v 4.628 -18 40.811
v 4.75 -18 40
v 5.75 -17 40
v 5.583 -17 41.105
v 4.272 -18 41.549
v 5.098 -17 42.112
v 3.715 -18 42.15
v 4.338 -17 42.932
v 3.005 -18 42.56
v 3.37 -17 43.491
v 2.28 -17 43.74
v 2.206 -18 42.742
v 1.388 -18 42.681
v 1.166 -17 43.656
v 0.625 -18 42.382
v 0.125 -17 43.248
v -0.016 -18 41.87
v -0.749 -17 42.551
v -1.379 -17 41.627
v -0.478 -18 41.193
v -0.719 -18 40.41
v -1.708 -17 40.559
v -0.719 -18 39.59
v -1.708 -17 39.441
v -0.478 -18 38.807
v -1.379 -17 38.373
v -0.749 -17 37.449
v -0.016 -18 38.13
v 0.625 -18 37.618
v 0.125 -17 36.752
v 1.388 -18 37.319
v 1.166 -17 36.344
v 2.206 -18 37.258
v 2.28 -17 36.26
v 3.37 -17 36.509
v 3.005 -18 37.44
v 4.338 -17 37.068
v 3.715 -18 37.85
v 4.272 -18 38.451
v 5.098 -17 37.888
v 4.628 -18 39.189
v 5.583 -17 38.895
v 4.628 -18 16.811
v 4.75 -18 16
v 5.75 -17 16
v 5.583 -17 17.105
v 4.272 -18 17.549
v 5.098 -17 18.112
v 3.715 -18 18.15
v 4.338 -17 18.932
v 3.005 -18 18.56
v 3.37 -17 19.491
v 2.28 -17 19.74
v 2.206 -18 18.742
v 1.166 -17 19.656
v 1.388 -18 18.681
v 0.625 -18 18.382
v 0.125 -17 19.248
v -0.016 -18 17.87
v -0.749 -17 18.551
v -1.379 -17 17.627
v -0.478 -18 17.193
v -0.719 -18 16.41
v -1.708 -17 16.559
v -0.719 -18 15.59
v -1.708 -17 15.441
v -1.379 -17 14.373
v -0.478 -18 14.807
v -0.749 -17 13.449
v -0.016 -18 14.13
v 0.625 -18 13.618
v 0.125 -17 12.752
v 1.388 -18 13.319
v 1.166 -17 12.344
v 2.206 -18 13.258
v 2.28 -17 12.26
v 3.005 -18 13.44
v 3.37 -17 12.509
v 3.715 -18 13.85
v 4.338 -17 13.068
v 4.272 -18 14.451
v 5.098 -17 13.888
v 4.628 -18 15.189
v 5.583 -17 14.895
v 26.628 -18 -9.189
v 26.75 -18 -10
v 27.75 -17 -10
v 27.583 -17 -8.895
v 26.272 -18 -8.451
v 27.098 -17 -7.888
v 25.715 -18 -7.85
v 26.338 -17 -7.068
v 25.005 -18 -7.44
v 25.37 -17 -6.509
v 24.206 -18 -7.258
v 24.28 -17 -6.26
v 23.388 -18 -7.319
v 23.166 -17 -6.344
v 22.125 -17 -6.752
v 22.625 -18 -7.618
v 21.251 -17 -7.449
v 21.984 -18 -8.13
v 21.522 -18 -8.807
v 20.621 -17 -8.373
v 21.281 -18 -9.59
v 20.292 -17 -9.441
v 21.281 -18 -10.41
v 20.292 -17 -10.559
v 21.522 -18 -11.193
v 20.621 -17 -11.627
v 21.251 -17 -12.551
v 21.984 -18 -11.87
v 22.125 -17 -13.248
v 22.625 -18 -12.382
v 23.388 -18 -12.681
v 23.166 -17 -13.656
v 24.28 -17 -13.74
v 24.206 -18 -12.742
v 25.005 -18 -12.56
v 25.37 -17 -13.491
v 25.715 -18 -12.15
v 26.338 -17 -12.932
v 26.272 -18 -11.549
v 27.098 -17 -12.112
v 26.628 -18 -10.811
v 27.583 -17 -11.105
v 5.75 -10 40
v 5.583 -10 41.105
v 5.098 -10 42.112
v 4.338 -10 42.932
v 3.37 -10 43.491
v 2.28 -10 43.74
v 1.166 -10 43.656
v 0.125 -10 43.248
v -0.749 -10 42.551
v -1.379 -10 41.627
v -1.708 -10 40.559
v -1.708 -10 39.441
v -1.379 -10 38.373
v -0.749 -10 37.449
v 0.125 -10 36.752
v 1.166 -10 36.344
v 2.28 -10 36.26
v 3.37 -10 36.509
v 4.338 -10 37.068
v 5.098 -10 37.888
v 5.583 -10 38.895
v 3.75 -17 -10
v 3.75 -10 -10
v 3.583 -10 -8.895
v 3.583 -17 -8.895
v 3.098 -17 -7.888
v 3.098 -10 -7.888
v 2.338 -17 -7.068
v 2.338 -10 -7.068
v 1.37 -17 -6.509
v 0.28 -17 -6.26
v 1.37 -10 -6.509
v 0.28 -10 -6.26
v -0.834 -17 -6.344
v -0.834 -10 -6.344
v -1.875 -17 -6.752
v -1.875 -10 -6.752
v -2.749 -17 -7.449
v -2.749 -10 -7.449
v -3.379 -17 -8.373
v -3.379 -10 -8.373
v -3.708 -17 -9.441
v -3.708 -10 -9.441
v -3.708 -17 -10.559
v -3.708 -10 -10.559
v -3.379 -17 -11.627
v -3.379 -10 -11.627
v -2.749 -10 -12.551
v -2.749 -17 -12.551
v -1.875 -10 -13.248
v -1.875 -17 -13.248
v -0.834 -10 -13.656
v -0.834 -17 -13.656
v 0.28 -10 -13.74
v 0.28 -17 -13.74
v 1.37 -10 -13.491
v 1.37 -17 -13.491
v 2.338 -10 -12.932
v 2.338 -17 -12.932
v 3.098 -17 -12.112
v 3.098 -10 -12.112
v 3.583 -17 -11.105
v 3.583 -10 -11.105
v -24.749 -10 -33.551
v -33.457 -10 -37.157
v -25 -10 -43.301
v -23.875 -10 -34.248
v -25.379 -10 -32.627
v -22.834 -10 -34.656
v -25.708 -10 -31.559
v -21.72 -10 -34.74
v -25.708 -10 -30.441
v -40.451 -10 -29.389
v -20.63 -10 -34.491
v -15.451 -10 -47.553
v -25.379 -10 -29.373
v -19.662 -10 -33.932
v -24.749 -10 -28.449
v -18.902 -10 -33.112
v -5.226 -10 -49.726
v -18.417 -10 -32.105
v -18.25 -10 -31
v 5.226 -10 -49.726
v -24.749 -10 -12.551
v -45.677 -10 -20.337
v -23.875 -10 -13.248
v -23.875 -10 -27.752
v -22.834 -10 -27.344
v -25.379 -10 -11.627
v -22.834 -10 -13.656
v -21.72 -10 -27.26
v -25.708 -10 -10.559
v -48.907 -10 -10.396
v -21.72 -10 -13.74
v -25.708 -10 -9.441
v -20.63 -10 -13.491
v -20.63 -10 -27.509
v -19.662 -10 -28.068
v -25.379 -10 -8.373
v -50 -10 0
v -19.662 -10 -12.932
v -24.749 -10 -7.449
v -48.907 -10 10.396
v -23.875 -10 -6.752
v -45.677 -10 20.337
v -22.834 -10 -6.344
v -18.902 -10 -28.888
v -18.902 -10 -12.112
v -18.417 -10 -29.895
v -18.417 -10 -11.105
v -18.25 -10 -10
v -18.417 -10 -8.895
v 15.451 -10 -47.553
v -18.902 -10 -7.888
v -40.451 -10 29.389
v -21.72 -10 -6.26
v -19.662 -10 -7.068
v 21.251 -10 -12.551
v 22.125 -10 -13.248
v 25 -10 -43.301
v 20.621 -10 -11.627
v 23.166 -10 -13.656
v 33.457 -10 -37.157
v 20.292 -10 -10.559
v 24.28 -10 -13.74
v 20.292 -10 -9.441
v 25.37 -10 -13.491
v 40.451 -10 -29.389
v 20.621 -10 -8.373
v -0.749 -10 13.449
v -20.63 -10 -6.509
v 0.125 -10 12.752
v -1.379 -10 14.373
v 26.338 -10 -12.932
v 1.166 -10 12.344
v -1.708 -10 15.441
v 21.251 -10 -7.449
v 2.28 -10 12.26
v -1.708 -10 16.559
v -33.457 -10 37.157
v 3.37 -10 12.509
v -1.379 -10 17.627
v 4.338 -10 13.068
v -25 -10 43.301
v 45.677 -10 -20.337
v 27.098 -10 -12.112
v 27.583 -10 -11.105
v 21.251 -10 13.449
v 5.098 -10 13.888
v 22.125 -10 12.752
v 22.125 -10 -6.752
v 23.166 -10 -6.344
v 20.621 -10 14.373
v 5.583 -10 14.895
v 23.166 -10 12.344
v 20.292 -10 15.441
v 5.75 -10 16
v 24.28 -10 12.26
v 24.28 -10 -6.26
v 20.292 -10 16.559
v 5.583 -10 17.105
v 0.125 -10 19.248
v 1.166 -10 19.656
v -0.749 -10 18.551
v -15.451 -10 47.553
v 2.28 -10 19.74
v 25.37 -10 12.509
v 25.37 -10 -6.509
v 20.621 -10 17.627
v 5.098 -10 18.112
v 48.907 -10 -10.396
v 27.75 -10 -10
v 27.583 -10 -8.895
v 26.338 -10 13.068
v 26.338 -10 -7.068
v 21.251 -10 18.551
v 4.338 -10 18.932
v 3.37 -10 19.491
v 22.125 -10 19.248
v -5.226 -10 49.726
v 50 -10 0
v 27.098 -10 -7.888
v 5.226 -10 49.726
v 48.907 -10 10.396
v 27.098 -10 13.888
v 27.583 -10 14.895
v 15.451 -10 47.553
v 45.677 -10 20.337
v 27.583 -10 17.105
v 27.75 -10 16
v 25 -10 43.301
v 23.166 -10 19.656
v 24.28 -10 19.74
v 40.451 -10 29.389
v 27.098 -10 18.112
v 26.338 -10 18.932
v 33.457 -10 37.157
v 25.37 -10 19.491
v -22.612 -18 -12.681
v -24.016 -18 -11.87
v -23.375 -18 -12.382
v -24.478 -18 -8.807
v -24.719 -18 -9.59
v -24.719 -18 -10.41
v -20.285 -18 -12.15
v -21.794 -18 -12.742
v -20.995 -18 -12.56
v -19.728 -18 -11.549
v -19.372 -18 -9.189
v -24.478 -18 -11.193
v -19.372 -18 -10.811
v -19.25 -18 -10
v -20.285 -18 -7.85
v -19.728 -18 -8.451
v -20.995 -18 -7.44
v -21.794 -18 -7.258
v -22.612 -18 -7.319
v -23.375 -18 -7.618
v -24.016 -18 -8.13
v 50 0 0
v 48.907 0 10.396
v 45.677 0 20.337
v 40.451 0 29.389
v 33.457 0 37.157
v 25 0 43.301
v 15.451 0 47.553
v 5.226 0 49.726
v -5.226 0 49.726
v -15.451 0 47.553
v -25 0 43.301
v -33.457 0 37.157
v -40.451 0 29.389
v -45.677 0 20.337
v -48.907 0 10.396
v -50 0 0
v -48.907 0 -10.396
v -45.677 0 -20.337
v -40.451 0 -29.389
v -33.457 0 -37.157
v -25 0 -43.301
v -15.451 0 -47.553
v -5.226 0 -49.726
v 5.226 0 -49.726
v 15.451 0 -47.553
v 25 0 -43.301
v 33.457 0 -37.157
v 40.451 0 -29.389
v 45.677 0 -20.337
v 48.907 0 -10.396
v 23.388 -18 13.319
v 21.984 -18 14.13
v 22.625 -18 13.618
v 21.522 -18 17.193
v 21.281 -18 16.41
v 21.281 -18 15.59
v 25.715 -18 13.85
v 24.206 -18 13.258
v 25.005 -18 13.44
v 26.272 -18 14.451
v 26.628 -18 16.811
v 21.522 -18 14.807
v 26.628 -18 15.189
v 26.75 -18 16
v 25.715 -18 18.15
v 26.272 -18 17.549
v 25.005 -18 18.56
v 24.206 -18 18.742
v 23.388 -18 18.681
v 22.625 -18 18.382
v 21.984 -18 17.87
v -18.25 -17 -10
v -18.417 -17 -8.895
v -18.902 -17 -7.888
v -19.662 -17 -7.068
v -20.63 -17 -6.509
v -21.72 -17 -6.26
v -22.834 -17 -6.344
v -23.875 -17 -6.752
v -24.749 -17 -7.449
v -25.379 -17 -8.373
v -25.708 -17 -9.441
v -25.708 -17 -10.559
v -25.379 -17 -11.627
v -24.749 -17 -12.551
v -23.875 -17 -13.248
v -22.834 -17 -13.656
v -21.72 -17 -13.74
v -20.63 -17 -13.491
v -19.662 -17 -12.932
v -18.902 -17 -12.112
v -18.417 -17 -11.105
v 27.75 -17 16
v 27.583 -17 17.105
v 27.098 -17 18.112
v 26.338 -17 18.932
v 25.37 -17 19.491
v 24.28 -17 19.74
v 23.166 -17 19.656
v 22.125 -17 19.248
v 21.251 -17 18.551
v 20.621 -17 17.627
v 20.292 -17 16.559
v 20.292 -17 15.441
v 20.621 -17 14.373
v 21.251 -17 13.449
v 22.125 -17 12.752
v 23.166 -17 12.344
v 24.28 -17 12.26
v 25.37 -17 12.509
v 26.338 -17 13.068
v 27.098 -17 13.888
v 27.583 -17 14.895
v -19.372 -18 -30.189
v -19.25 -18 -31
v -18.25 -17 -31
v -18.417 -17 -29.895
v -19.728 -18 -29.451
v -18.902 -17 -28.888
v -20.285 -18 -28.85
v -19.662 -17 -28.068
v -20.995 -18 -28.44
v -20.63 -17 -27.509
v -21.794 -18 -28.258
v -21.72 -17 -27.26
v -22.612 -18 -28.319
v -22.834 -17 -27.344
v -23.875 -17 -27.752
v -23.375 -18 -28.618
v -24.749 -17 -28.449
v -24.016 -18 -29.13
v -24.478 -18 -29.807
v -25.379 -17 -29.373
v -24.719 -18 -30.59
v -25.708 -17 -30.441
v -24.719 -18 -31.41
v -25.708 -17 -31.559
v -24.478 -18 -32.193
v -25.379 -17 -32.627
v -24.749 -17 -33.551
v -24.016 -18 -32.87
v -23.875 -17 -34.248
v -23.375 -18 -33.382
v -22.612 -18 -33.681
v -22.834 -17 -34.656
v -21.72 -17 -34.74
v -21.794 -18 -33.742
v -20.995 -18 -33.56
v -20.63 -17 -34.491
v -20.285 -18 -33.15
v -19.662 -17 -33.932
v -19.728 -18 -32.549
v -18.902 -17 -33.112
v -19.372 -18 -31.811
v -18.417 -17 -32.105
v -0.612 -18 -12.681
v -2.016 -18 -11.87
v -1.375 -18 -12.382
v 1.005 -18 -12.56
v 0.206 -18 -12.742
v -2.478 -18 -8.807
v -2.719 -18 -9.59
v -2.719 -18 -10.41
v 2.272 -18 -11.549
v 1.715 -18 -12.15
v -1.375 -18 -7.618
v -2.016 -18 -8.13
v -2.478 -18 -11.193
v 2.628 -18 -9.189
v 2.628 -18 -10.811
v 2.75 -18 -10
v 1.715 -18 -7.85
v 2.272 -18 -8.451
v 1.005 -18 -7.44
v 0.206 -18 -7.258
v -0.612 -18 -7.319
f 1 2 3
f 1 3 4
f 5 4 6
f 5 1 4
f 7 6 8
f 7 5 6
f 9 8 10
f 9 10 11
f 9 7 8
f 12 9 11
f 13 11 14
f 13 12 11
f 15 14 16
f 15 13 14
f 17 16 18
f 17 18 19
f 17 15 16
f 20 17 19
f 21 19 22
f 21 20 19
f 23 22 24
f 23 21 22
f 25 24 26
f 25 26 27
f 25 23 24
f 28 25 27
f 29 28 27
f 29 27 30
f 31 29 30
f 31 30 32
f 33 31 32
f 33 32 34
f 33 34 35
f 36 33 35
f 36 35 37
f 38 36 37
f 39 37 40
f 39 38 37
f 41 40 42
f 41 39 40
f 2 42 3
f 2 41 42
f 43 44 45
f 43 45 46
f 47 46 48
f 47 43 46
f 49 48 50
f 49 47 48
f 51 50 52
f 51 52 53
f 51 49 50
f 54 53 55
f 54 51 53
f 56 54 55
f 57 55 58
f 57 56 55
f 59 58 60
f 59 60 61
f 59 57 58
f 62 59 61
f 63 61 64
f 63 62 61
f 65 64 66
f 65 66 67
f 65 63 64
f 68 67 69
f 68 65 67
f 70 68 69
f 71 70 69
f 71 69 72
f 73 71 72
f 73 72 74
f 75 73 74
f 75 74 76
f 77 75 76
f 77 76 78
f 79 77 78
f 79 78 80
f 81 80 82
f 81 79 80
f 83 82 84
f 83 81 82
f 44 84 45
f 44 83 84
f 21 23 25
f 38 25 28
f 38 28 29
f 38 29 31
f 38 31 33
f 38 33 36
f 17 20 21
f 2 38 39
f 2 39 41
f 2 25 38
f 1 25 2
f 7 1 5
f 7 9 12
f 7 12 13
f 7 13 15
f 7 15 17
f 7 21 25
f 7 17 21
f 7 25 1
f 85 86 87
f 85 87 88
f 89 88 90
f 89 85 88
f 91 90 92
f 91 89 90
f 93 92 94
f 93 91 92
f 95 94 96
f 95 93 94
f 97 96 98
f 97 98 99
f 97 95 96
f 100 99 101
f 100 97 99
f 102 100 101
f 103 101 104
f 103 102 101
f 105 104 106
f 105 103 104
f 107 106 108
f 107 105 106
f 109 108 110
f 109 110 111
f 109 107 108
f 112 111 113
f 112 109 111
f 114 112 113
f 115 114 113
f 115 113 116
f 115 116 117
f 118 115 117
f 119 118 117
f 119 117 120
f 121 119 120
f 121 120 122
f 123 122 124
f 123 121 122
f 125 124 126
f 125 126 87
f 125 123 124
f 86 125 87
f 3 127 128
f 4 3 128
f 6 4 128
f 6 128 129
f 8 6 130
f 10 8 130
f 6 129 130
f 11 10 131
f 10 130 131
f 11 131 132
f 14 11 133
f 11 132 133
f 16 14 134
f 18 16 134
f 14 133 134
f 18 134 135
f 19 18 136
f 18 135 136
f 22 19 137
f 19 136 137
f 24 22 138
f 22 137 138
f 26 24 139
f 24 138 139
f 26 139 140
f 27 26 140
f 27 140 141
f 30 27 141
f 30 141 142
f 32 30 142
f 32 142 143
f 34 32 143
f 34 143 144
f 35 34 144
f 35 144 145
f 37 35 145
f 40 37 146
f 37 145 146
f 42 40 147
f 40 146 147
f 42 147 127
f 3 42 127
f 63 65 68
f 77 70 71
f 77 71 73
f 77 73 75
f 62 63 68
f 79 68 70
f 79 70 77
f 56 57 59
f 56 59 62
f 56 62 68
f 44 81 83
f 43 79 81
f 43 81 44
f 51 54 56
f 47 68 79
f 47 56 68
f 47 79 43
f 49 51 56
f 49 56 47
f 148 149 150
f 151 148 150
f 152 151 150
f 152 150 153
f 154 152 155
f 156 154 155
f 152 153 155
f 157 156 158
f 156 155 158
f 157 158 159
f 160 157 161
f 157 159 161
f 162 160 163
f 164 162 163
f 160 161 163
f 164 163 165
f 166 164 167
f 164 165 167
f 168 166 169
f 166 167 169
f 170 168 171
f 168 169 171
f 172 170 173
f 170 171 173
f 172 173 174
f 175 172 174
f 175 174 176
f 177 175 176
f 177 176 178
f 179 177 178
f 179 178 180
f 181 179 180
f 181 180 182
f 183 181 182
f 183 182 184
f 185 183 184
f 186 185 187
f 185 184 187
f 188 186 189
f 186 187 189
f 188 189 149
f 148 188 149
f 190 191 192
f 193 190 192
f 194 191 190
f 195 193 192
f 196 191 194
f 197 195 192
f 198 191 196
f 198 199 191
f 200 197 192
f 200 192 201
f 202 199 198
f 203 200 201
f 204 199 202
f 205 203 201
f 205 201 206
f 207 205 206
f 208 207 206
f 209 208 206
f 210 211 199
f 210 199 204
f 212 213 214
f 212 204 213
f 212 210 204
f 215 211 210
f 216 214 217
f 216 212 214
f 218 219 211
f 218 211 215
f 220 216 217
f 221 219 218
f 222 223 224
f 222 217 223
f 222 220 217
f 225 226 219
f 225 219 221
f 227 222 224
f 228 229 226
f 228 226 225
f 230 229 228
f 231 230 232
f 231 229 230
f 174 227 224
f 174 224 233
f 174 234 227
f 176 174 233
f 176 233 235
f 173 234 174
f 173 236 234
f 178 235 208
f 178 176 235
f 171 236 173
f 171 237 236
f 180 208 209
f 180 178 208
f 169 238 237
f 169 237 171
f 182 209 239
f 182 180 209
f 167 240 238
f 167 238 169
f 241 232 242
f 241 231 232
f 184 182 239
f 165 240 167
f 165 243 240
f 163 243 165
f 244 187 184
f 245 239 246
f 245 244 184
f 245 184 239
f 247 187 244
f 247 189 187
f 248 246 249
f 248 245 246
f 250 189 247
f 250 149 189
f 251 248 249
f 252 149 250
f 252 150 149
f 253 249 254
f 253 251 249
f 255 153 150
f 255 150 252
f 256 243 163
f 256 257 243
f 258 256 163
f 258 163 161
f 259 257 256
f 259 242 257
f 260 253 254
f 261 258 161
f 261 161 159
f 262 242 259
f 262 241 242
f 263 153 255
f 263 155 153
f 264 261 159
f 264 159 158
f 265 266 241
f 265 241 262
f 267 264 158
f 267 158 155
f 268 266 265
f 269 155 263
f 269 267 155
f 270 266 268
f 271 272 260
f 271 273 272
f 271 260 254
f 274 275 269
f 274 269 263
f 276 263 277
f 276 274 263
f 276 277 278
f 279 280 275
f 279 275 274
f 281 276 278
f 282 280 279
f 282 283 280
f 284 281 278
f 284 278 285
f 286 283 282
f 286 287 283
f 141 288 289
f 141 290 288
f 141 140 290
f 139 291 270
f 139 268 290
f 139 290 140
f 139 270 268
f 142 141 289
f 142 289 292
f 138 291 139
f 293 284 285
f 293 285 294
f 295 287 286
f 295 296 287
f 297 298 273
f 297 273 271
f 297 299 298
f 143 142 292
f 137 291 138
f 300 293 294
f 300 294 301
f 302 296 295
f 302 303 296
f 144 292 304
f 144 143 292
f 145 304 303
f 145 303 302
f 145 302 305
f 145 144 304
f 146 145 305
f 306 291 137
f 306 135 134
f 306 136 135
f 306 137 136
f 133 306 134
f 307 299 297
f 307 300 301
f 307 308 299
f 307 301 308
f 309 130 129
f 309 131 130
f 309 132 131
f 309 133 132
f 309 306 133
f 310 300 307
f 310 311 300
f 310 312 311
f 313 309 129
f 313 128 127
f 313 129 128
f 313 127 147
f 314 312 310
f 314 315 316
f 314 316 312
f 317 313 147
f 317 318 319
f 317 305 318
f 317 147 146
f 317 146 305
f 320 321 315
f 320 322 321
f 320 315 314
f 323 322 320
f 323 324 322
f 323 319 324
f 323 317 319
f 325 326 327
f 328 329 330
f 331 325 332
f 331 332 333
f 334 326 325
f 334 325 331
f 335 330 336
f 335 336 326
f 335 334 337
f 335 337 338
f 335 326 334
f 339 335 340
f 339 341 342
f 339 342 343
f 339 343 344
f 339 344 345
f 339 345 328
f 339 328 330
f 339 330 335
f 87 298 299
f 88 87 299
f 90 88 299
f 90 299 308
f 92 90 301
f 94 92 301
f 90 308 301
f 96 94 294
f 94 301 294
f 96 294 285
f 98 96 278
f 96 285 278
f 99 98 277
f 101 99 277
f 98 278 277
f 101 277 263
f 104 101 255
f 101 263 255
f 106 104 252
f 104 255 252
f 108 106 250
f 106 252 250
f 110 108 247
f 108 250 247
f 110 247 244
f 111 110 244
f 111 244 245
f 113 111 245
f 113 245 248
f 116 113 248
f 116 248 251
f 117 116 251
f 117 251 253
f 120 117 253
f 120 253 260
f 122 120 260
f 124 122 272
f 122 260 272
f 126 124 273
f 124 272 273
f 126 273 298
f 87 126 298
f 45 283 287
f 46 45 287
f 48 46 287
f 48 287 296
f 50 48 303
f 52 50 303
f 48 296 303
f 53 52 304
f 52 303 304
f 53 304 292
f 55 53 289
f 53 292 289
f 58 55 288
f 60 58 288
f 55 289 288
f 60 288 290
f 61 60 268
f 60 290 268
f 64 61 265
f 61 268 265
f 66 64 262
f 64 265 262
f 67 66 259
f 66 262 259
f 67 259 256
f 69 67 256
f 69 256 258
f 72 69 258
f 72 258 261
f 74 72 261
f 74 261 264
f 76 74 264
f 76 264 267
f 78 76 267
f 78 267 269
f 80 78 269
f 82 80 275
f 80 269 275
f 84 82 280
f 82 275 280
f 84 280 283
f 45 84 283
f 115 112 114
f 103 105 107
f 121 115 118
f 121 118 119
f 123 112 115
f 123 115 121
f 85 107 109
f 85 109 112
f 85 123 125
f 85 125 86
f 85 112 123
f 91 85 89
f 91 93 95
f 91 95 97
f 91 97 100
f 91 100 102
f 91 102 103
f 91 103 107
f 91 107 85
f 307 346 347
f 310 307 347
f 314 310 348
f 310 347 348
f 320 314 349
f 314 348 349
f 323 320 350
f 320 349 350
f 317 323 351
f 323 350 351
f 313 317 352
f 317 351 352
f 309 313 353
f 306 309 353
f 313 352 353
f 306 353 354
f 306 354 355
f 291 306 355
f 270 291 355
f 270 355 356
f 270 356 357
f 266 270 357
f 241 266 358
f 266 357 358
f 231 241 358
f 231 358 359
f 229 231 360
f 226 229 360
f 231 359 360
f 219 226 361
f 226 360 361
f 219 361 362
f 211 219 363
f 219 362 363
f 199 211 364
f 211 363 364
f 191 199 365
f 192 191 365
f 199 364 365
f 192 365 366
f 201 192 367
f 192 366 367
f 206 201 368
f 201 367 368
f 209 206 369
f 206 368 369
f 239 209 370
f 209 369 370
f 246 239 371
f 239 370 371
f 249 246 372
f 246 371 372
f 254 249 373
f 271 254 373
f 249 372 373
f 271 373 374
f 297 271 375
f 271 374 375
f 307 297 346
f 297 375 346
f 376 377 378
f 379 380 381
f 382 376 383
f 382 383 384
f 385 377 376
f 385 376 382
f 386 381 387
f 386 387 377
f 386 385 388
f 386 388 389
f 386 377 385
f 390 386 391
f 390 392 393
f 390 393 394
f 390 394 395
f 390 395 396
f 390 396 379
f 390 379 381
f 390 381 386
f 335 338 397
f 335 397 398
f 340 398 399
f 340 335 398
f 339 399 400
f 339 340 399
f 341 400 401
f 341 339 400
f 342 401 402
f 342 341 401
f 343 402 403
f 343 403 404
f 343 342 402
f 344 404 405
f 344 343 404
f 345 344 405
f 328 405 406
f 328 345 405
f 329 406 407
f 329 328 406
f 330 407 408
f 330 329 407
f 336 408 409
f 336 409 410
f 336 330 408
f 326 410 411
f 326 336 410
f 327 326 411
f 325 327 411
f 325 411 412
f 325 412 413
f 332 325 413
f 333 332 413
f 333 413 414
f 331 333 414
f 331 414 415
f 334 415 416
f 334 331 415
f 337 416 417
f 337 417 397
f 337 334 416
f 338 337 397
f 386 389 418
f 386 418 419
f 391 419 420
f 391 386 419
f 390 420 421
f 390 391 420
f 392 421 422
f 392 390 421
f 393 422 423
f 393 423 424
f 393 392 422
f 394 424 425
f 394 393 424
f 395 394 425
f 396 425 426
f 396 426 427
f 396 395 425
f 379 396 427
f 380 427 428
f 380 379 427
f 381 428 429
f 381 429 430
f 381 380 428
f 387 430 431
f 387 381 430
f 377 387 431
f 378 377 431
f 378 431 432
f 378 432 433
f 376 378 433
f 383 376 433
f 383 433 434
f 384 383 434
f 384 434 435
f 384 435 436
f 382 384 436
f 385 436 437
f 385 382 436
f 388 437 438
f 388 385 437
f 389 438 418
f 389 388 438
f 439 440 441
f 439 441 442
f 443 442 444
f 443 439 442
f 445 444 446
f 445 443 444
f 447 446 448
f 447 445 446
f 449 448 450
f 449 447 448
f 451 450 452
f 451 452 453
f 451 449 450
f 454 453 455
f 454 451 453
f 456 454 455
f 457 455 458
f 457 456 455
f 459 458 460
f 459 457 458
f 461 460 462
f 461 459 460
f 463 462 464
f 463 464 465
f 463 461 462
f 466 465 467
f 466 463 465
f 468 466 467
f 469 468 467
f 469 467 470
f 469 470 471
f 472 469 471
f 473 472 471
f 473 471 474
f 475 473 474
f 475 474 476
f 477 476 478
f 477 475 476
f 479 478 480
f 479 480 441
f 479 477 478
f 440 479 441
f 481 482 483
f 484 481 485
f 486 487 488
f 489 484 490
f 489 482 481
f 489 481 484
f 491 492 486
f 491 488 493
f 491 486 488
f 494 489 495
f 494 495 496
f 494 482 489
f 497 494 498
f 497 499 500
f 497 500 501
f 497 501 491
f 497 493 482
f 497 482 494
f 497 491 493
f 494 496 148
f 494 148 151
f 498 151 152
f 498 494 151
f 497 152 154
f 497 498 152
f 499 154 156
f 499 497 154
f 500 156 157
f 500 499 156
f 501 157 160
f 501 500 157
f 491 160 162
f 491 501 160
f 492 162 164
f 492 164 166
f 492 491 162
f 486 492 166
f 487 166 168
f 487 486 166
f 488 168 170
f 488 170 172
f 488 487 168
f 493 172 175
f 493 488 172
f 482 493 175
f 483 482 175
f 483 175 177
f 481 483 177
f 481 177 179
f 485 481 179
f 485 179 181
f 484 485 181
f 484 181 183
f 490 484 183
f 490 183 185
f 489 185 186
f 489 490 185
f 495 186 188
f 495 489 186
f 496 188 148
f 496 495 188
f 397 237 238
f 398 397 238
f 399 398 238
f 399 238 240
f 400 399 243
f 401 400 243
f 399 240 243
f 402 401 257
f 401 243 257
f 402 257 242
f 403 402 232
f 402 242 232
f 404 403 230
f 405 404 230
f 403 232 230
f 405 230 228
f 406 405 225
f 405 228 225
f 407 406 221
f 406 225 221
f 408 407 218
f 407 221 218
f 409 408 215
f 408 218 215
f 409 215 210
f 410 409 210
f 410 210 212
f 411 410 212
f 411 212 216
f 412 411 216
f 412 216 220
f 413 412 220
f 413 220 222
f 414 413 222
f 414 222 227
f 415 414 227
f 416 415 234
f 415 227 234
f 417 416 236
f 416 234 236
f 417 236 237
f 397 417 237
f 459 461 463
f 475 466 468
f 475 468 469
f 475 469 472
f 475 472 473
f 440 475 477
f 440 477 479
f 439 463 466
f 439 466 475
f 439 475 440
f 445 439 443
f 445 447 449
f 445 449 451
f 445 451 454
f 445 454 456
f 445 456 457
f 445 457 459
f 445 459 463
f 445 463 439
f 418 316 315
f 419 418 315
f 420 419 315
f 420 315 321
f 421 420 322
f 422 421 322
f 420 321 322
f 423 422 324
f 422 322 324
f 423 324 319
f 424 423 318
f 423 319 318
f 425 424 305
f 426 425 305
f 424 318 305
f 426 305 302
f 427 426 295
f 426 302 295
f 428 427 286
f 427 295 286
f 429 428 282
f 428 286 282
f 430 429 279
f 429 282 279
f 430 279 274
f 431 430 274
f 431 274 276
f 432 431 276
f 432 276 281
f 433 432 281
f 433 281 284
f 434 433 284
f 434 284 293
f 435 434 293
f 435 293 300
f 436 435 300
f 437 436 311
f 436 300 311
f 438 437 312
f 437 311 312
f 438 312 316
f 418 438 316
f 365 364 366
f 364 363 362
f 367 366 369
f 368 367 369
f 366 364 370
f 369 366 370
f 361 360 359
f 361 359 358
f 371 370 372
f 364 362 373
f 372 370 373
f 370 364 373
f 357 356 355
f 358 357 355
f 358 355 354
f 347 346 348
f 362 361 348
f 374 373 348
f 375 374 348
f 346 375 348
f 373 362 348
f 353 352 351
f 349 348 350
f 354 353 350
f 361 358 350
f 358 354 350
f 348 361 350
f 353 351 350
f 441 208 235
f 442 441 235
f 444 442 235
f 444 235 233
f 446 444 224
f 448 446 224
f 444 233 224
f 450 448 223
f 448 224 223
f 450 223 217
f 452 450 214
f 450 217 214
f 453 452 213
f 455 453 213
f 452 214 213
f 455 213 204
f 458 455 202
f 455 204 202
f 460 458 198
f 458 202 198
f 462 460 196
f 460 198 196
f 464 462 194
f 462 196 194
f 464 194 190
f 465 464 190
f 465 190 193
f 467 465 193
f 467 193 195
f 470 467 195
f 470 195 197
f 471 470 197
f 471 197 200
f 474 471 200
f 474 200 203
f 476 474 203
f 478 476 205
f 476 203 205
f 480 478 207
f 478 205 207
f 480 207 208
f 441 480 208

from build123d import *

# Parameters (mm, degrees)
F0_R     = 50
F1_DEPTH = 10
F2_R     = 3.75
F3_DEPTH = 8
F4_SIZE  = 1


with BuildPart() as f1:
    # F0 (on Front) → F1 (new body)
    with BuildSketch(Plane.XZ):
        Circle(F0_R)
    extrude(amount=F1_DEPTH)

    # F2 (on face) → F3 (join)
    with BuildSketch(Plane.XZ.offset(10)):
        with Locations((2, 40)):
            Circle(F2_R)
        with Locations((2, 16)):
            Circle(F2_R)
        with Locations((24, 16)):
            Circle(F2_R)
        with Locations((24, -10)):
            Circle(F2_R)
        with Locations((0, -10)):
            Circle(F2_R)
        with Locations((-22, -10)):
            Circle(F2_R)
        with Locations((-22, -31)):
            Circle(F2_R)
    extrude(amount=F3_DEPTH)

    # F4
    f4_edges = [f1.edges().sort_by_distance(p)[0] for p in [
        (-1.75, -18, 40),
        (-1.75, -18, 16),
        (20.25, -18, 16),
        (20.25, -18, -10),
        (-3.75, -18, -10),
        (-25.75, -18, -10),
        (-25.75, -18, -31),
    ]]
    chamfer(f4_edges, length=F4_SIZE)


solid = f1.part
